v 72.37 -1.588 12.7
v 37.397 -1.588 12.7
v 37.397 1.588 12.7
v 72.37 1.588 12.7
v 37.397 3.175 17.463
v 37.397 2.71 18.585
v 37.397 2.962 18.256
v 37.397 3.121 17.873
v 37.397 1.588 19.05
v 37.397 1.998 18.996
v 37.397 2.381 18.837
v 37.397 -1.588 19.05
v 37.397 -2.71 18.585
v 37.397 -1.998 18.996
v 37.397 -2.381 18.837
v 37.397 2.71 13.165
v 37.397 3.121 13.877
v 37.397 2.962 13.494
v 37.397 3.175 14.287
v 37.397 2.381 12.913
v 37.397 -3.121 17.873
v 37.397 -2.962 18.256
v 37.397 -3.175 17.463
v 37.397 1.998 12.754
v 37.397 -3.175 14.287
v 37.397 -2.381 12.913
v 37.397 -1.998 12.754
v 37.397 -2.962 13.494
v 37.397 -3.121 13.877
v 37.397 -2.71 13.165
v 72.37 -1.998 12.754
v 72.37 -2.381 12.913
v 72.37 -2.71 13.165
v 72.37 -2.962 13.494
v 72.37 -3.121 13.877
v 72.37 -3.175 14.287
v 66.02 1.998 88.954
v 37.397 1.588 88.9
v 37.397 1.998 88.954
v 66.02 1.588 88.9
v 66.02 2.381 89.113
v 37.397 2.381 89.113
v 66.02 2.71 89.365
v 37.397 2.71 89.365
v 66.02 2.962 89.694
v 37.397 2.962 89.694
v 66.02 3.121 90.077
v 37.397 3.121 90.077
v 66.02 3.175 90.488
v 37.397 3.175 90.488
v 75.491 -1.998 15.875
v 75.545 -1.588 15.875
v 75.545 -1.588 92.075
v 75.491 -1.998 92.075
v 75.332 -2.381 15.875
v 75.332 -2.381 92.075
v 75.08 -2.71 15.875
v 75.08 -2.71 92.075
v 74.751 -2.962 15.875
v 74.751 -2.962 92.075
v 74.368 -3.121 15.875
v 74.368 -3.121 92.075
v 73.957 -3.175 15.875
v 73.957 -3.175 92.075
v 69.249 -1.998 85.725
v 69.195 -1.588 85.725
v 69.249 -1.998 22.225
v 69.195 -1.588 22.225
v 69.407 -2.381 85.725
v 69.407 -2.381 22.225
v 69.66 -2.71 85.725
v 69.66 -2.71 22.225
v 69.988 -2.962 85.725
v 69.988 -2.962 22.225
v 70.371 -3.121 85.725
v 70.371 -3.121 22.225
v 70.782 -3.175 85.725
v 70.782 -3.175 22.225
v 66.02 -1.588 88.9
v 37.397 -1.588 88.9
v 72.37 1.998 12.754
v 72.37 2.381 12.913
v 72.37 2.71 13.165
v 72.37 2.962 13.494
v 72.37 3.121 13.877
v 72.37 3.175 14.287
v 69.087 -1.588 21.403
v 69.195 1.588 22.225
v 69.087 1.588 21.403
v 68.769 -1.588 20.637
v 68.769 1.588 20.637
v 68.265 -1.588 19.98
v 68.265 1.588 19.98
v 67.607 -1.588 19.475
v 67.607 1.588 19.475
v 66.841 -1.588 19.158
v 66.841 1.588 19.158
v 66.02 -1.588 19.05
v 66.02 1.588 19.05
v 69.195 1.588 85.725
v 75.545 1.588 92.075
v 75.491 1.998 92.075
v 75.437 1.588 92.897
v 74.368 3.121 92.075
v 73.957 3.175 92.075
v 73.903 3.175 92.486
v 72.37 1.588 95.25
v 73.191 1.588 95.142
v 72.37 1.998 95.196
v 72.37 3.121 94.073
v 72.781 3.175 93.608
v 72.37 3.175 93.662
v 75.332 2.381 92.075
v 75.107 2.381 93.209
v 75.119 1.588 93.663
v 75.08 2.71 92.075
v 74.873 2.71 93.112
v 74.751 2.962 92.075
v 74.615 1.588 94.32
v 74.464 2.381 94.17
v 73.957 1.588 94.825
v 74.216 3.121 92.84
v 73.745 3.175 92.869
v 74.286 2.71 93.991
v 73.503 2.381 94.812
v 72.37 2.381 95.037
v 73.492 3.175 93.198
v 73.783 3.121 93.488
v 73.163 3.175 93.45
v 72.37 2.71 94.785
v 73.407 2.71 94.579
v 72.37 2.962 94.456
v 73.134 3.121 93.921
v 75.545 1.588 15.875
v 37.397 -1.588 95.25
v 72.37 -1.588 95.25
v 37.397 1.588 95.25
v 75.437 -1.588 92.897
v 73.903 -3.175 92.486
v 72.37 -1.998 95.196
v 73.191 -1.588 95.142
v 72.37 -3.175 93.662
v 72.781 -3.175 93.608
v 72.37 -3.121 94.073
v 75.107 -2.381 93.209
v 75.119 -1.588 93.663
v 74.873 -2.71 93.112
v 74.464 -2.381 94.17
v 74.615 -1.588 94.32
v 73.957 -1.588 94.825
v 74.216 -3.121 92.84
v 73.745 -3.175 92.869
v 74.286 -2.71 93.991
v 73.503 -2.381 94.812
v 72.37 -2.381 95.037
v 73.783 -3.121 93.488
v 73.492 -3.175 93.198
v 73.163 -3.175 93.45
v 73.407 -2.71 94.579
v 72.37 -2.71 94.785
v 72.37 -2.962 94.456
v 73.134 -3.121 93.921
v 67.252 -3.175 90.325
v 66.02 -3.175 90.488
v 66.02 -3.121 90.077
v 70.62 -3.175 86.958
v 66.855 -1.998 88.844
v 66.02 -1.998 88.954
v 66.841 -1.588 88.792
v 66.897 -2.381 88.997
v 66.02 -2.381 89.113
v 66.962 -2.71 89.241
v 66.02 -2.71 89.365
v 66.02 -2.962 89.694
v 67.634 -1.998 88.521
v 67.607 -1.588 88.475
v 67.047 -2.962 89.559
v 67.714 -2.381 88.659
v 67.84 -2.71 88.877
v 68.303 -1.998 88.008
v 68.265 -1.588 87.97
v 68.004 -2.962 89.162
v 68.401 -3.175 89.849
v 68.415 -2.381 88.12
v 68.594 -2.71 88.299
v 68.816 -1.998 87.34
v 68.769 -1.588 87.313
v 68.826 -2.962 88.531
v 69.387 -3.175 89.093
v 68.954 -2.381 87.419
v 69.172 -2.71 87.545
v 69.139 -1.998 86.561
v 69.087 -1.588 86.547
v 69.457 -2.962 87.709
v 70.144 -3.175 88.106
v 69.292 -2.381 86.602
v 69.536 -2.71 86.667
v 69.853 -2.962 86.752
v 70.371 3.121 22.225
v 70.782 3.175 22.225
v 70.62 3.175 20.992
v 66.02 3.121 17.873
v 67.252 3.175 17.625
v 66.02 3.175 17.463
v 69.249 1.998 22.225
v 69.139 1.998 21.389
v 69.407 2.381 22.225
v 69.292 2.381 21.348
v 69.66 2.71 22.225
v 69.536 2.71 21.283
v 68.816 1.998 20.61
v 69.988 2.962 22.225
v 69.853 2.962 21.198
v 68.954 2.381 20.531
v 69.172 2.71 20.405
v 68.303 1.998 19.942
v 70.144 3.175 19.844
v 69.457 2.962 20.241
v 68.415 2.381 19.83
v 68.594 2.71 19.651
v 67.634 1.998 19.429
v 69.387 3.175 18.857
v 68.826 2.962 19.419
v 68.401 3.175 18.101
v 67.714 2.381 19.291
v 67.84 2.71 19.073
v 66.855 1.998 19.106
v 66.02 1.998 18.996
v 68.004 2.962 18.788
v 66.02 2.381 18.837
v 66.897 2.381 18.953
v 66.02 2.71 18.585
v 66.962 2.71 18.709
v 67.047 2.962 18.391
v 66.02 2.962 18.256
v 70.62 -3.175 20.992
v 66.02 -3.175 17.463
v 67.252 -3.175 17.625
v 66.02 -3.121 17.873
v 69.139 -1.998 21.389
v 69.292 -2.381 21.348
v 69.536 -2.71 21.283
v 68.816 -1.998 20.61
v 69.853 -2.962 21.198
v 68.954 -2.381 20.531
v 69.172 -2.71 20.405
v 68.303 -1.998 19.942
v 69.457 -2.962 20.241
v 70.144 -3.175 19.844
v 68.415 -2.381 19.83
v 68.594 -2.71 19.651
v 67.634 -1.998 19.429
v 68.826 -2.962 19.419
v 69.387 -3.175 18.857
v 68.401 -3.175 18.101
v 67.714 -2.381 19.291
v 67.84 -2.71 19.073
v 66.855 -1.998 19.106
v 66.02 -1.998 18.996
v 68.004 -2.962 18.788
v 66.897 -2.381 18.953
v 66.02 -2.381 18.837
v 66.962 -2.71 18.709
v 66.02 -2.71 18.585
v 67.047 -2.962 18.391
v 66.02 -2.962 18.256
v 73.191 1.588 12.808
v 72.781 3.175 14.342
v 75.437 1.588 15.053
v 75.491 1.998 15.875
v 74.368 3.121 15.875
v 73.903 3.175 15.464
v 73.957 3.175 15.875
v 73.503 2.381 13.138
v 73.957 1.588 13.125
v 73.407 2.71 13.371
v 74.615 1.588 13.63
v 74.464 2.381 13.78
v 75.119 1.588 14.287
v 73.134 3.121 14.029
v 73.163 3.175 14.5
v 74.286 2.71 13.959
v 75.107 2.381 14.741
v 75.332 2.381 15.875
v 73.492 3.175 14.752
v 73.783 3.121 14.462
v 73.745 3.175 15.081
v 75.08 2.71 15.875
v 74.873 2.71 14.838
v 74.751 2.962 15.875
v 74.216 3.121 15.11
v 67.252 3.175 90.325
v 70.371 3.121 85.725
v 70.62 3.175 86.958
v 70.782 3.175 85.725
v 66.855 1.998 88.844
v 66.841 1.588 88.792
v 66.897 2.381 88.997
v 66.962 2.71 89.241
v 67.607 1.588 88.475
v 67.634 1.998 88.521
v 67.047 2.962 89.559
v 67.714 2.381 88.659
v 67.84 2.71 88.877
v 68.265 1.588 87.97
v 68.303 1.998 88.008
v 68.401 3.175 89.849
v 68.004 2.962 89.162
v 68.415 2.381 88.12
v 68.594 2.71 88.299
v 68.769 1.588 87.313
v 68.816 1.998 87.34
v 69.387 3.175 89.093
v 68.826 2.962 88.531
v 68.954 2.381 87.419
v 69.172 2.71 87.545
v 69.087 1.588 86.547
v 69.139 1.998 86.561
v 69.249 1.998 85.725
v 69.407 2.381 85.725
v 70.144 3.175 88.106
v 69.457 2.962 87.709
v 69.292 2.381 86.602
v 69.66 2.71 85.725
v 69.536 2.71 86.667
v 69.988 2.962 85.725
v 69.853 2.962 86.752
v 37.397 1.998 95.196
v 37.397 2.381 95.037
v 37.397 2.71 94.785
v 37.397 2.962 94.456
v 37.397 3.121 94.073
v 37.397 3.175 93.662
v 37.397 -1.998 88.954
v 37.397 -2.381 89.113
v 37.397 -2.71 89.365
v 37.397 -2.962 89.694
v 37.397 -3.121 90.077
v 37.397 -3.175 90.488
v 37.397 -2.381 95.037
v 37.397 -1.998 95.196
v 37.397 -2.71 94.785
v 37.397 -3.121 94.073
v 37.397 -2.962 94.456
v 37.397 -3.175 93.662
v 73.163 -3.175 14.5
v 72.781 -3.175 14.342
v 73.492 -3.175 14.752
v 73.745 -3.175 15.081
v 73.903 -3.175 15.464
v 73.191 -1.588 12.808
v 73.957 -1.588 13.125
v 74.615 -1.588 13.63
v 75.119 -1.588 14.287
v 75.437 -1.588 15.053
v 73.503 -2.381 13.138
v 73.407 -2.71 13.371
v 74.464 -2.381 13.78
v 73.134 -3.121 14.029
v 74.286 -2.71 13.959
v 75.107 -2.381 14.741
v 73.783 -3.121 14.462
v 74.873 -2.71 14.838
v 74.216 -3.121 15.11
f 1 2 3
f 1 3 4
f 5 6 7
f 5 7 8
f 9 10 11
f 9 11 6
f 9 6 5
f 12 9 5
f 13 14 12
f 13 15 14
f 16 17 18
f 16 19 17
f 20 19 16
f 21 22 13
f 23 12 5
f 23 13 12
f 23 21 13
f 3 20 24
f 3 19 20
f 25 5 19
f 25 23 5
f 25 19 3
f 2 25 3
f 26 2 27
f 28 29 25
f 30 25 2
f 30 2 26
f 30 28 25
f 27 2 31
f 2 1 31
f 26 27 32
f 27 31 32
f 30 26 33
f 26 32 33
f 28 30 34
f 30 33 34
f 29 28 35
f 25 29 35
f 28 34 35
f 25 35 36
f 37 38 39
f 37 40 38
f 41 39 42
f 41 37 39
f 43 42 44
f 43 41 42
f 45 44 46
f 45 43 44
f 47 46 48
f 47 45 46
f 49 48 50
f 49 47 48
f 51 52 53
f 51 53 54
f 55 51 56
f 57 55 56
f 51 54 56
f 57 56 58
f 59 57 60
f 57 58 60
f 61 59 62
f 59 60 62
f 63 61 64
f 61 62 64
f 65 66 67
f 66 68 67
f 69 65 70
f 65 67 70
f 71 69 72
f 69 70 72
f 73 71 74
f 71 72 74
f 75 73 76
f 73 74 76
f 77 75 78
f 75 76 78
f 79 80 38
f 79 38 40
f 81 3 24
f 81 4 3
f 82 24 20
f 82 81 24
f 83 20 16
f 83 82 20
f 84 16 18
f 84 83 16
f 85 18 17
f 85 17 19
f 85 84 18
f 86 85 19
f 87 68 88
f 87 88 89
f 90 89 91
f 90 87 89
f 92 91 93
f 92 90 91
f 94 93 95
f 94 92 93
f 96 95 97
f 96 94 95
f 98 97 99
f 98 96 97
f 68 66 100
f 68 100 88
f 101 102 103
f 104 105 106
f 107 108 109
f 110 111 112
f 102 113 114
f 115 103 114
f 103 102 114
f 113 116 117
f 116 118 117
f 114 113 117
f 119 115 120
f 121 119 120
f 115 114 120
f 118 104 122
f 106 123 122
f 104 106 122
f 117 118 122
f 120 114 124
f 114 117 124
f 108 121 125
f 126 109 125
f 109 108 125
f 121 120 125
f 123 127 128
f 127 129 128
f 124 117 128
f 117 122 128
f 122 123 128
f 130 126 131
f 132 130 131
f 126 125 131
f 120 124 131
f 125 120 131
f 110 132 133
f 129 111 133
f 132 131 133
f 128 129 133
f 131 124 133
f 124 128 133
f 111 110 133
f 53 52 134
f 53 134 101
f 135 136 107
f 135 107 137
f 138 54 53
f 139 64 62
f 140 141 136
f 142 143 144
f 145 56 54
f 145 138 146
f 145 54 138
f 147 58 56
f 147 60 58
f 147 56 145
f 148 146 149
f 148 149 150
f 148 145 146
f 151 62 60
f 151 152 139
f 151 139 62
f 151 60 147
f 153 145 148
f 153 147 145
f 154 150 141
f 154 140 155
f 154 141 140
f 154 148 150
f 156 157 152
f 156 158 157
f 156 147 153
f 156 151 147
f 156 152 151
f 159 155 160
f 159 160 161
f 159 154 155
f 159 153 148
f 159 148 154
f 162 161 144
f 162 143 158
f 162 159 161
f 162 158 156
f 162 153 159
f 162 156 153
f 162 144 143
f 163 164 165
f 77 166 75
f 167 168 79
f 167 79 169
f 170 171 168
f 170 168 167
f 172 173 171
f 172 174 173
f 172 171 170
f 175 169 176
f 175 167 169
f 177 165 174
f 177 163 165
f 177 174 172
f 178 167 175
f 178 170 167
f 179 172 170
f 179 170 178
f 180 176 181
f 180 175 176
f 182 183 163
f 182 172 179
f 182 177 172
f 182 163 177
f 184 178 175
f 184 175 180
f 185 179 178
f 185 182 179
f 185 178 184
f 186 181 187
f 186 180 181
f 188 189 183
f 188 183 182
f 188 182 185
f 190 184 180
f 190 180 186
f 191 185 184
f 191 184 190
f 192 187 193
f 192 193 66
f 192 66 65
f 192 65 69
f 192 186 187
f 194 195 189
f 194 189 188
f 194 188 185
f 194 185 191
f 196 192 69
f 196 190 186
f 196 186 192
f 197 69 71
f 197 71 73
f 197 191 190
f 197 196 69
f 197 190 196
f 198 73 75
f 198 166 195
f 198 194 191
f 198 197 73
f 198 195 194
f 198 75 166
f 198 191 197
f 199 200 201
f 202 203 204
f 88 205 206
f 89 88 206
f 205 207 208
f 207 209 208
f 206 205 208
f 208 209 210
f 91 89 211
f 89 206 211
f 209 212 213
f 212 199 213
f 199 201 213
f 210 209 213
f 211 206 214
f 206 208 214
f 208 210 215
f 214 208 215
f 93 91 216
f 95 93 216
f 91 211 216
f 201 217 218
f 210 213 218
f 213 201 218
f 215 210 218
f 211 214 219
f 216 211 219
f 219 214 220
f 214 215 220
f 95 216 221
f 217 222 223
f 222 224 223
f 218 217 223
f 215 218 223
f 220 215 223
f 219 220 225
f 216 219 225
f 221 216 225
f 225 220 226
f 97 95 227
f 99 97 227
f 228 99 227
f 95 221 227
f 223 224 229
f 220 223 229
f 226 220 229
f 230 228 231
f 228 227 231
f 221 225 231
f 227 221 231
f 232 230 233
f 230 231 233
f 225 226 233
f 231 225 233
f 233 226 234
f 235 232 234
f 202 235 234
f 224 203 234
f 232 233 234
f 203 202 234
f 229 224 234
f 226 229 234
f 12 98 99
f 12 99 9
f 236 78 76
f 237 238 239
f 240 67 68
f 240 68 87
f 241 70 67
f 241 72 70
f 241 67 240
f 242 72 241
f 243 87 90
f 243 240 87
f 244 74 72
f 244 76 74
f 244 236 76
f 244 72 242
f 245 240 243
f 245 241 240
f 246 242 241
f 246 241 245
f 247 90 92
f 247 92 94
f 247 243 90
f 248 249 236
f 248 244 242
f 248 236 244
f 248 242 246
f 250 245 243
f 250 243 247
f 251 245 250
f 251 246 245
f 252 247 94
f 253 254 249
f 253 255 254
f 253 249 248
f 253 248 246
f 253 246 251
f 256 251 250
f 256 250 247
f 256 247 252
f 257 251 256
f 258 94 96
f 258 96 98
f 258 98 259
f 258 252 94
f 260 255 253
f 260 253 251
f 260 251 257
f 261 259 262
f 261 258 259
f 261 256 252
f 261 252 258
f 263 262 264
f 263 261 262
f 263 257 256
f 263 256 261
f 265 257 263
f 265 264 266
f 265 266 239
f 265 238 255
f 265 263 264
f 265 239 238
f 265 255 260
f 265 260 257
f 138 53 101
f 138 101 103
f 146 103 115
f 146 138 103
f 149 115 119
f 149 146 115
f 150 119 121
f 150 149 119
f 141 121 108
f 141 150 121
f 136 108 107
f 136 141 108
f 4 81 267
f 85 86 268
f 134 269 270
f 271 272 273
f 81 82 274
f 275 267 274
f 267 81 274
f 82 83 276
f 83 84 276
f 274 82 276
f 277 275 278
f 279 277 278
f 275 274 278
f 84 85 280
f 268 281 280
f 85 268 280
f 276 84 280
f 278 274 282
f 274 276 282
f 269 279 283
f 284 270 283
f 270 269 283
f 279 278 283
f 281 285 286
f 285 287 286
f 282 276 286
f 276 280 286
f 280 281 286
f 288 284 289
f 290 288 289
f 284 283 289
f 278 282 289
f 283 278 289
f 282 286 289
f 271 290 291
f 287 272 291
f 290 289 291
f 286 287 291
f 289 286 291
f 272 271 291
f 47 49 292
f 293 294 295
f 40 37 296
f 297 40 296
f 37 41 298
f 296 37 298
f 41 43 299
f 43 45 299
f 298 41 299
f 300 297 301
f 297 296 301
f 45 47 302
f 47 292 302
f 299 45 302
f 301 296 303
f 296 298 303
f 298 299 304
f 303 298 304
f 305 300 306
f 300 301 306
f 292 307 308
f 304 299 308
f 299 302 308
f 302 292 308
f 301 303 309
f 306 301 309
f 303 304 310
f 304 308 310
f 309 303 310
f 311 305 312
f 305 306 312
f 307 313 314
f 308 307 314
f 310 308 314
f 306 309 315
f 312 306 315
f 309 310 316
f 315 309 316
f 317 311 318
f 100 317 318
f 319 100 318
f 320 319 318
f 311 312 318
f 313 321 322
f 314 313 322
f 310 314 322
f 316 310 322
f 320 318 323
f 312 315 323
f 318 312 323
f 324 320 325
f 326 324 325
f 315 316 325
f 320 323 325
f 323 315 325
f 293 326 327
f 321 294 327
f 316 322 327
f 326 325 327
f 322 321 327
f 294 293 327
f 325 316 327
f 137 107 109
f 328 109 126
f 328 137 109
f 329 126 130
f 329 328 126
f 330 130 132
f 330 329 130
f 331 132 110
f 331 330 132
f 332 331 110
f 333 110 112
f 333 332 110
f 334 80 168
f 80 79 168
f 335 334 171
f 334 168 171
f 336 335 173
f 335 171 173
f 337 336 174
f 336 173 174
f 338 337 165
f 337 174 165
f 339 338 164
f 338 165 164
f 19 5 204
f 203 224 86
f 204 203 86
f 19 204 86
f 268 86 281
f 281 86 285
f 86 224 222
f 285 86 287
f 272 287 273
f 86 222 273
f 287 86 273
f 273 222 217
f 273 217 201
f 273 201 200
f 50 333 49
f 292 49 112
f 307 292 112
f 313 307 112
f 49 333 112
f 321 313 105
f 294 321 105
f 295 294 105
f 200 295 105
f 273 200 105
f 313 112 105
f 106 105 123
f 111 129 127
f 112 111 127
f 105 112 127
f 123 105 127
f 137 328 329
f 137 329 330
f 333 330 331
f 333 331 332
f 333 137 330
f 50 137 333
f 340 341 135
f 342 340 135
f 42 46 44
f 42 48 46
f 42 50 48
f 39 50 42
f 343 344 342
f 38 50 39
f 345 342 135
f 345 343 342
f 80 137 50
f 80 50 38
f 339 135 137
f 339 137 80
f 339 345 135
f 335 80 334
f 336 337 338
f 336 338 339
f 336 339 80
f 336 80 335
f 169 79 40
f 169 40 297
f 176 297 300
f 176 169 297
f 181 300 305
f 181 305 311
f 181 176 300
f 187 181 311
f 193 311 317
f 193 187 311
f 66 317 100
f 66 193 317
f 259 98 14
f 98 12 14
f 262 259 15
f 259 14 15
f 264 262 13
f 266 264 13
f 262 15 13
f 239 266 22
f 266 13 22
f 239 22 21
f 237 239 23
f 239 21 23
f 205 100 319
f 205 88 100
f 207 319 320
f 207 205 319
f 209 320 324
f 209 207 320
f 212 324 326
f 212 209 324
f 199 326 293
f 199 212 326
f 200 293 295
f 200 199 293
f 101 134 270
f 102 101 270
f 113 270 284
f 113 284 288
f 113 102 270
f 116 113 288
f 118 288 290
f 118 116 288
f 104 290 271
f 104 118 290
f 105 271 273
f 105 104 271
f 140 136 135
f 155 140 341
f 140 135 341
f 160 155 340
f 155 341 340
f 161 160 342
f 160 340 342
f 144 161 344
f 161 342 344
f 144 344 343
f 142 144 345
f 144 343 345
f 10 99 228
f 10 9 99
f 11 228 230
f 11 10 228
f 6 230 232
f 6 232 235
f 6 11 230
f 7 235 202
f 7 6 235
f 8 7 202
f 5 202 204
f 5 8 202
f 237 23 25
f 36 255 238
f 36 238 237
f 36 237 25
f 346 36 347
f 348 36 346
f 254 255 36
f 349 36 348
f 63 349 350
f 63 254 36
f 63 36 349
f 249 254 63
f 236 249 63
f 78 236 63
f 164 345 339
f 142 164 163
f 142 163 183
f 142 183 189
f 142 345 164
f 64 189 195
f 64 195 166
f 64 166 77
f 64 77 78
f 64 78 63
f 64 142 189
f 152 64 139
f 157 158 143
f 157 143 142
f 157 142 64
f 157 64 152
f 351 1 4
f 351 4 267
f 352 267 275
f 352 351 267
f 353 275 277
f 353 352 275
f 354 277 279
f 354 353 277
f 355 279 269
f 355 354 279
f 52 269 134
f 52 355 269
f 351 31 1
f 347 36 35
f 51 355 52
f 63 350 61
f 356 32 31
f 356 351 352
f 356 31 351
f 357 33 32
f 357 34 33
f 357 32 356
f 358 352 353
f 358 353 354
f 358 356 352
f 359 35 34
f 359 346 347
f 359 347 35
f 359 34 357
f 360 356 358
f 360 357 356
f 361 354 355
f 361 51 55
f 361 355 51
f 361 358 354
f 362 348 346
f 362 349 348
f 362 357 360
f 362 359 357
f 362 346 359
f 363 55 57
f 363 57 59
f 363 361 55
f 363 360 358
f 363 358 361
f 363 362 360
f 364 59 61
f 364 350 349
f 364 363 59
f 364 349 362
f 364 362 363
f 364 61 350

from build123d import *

# Parameters (mm, degrees)
F3_DEPTH = 3.175
F4_R     = 1.5875


# Not quite as in the source:
# - the program builds the solid bodies; features that only make, move or delete a surface that nothing else refers to are left out


with BuildPart() as f3:
    # F2 (on Front) → F3 (new body, symmetric)
    with BuildSketch(Plane.XZ):
        with BuildLine():
            Line((72.3697372794, 95.25), (37.3974703252, 95.25))
            Line((37.3974703252, 95.25), (37.3974703252, 88.9))
            Line((37.3974703252, 88.9), (66.0197372794, 88.9))
            ThreePointArc((66.0197372794, 88.9), (68.2648013097, 87.9700640303), (69.1947372794, 85.725))
            Line((69.1947372794, 85.725), (69.1947372794, 22.225))
            ThreePointArc((69.1947372794, 22.225), (68.2648013097, 19.9799359697), (66.0197372794, 19.05))
            Line((66.0197372794, 19.05), (37.3974703252, 19.05))
            Line((37.3974703252, 19.05), (37.3974703252, 12.7))
            Line((37.3974703252, 12.7), (72.3697372794, 12.7))
            ThreePointArc((72.3697372794, 12.7), (74.6148013097, 13.6299359697), (75.5447372794, 15.875))
            Line((75.5447372794, 15.875), (75.5447372794, 92.075))
            ThreePointArc((75.5447372794, 92.075), (74.6148013097, 94.3200640303), (72.3697372794, 95.25))
        make_face()
    extrude(amount=F3_DEPTH, both=True)

    # F4
    f4_edges = [f3.edges().sort_by_distance(p)[0] for p in [
        (54.883604, -3.175, 12.7),
        (54.883604, 3.175, 12.7),
        (51.708604, 3.175, 19.05),
        (51.708604, -3.175, 19.05),
    ]]
    fillet(f4_edges, radius=F4_R)


solid = f3.part
